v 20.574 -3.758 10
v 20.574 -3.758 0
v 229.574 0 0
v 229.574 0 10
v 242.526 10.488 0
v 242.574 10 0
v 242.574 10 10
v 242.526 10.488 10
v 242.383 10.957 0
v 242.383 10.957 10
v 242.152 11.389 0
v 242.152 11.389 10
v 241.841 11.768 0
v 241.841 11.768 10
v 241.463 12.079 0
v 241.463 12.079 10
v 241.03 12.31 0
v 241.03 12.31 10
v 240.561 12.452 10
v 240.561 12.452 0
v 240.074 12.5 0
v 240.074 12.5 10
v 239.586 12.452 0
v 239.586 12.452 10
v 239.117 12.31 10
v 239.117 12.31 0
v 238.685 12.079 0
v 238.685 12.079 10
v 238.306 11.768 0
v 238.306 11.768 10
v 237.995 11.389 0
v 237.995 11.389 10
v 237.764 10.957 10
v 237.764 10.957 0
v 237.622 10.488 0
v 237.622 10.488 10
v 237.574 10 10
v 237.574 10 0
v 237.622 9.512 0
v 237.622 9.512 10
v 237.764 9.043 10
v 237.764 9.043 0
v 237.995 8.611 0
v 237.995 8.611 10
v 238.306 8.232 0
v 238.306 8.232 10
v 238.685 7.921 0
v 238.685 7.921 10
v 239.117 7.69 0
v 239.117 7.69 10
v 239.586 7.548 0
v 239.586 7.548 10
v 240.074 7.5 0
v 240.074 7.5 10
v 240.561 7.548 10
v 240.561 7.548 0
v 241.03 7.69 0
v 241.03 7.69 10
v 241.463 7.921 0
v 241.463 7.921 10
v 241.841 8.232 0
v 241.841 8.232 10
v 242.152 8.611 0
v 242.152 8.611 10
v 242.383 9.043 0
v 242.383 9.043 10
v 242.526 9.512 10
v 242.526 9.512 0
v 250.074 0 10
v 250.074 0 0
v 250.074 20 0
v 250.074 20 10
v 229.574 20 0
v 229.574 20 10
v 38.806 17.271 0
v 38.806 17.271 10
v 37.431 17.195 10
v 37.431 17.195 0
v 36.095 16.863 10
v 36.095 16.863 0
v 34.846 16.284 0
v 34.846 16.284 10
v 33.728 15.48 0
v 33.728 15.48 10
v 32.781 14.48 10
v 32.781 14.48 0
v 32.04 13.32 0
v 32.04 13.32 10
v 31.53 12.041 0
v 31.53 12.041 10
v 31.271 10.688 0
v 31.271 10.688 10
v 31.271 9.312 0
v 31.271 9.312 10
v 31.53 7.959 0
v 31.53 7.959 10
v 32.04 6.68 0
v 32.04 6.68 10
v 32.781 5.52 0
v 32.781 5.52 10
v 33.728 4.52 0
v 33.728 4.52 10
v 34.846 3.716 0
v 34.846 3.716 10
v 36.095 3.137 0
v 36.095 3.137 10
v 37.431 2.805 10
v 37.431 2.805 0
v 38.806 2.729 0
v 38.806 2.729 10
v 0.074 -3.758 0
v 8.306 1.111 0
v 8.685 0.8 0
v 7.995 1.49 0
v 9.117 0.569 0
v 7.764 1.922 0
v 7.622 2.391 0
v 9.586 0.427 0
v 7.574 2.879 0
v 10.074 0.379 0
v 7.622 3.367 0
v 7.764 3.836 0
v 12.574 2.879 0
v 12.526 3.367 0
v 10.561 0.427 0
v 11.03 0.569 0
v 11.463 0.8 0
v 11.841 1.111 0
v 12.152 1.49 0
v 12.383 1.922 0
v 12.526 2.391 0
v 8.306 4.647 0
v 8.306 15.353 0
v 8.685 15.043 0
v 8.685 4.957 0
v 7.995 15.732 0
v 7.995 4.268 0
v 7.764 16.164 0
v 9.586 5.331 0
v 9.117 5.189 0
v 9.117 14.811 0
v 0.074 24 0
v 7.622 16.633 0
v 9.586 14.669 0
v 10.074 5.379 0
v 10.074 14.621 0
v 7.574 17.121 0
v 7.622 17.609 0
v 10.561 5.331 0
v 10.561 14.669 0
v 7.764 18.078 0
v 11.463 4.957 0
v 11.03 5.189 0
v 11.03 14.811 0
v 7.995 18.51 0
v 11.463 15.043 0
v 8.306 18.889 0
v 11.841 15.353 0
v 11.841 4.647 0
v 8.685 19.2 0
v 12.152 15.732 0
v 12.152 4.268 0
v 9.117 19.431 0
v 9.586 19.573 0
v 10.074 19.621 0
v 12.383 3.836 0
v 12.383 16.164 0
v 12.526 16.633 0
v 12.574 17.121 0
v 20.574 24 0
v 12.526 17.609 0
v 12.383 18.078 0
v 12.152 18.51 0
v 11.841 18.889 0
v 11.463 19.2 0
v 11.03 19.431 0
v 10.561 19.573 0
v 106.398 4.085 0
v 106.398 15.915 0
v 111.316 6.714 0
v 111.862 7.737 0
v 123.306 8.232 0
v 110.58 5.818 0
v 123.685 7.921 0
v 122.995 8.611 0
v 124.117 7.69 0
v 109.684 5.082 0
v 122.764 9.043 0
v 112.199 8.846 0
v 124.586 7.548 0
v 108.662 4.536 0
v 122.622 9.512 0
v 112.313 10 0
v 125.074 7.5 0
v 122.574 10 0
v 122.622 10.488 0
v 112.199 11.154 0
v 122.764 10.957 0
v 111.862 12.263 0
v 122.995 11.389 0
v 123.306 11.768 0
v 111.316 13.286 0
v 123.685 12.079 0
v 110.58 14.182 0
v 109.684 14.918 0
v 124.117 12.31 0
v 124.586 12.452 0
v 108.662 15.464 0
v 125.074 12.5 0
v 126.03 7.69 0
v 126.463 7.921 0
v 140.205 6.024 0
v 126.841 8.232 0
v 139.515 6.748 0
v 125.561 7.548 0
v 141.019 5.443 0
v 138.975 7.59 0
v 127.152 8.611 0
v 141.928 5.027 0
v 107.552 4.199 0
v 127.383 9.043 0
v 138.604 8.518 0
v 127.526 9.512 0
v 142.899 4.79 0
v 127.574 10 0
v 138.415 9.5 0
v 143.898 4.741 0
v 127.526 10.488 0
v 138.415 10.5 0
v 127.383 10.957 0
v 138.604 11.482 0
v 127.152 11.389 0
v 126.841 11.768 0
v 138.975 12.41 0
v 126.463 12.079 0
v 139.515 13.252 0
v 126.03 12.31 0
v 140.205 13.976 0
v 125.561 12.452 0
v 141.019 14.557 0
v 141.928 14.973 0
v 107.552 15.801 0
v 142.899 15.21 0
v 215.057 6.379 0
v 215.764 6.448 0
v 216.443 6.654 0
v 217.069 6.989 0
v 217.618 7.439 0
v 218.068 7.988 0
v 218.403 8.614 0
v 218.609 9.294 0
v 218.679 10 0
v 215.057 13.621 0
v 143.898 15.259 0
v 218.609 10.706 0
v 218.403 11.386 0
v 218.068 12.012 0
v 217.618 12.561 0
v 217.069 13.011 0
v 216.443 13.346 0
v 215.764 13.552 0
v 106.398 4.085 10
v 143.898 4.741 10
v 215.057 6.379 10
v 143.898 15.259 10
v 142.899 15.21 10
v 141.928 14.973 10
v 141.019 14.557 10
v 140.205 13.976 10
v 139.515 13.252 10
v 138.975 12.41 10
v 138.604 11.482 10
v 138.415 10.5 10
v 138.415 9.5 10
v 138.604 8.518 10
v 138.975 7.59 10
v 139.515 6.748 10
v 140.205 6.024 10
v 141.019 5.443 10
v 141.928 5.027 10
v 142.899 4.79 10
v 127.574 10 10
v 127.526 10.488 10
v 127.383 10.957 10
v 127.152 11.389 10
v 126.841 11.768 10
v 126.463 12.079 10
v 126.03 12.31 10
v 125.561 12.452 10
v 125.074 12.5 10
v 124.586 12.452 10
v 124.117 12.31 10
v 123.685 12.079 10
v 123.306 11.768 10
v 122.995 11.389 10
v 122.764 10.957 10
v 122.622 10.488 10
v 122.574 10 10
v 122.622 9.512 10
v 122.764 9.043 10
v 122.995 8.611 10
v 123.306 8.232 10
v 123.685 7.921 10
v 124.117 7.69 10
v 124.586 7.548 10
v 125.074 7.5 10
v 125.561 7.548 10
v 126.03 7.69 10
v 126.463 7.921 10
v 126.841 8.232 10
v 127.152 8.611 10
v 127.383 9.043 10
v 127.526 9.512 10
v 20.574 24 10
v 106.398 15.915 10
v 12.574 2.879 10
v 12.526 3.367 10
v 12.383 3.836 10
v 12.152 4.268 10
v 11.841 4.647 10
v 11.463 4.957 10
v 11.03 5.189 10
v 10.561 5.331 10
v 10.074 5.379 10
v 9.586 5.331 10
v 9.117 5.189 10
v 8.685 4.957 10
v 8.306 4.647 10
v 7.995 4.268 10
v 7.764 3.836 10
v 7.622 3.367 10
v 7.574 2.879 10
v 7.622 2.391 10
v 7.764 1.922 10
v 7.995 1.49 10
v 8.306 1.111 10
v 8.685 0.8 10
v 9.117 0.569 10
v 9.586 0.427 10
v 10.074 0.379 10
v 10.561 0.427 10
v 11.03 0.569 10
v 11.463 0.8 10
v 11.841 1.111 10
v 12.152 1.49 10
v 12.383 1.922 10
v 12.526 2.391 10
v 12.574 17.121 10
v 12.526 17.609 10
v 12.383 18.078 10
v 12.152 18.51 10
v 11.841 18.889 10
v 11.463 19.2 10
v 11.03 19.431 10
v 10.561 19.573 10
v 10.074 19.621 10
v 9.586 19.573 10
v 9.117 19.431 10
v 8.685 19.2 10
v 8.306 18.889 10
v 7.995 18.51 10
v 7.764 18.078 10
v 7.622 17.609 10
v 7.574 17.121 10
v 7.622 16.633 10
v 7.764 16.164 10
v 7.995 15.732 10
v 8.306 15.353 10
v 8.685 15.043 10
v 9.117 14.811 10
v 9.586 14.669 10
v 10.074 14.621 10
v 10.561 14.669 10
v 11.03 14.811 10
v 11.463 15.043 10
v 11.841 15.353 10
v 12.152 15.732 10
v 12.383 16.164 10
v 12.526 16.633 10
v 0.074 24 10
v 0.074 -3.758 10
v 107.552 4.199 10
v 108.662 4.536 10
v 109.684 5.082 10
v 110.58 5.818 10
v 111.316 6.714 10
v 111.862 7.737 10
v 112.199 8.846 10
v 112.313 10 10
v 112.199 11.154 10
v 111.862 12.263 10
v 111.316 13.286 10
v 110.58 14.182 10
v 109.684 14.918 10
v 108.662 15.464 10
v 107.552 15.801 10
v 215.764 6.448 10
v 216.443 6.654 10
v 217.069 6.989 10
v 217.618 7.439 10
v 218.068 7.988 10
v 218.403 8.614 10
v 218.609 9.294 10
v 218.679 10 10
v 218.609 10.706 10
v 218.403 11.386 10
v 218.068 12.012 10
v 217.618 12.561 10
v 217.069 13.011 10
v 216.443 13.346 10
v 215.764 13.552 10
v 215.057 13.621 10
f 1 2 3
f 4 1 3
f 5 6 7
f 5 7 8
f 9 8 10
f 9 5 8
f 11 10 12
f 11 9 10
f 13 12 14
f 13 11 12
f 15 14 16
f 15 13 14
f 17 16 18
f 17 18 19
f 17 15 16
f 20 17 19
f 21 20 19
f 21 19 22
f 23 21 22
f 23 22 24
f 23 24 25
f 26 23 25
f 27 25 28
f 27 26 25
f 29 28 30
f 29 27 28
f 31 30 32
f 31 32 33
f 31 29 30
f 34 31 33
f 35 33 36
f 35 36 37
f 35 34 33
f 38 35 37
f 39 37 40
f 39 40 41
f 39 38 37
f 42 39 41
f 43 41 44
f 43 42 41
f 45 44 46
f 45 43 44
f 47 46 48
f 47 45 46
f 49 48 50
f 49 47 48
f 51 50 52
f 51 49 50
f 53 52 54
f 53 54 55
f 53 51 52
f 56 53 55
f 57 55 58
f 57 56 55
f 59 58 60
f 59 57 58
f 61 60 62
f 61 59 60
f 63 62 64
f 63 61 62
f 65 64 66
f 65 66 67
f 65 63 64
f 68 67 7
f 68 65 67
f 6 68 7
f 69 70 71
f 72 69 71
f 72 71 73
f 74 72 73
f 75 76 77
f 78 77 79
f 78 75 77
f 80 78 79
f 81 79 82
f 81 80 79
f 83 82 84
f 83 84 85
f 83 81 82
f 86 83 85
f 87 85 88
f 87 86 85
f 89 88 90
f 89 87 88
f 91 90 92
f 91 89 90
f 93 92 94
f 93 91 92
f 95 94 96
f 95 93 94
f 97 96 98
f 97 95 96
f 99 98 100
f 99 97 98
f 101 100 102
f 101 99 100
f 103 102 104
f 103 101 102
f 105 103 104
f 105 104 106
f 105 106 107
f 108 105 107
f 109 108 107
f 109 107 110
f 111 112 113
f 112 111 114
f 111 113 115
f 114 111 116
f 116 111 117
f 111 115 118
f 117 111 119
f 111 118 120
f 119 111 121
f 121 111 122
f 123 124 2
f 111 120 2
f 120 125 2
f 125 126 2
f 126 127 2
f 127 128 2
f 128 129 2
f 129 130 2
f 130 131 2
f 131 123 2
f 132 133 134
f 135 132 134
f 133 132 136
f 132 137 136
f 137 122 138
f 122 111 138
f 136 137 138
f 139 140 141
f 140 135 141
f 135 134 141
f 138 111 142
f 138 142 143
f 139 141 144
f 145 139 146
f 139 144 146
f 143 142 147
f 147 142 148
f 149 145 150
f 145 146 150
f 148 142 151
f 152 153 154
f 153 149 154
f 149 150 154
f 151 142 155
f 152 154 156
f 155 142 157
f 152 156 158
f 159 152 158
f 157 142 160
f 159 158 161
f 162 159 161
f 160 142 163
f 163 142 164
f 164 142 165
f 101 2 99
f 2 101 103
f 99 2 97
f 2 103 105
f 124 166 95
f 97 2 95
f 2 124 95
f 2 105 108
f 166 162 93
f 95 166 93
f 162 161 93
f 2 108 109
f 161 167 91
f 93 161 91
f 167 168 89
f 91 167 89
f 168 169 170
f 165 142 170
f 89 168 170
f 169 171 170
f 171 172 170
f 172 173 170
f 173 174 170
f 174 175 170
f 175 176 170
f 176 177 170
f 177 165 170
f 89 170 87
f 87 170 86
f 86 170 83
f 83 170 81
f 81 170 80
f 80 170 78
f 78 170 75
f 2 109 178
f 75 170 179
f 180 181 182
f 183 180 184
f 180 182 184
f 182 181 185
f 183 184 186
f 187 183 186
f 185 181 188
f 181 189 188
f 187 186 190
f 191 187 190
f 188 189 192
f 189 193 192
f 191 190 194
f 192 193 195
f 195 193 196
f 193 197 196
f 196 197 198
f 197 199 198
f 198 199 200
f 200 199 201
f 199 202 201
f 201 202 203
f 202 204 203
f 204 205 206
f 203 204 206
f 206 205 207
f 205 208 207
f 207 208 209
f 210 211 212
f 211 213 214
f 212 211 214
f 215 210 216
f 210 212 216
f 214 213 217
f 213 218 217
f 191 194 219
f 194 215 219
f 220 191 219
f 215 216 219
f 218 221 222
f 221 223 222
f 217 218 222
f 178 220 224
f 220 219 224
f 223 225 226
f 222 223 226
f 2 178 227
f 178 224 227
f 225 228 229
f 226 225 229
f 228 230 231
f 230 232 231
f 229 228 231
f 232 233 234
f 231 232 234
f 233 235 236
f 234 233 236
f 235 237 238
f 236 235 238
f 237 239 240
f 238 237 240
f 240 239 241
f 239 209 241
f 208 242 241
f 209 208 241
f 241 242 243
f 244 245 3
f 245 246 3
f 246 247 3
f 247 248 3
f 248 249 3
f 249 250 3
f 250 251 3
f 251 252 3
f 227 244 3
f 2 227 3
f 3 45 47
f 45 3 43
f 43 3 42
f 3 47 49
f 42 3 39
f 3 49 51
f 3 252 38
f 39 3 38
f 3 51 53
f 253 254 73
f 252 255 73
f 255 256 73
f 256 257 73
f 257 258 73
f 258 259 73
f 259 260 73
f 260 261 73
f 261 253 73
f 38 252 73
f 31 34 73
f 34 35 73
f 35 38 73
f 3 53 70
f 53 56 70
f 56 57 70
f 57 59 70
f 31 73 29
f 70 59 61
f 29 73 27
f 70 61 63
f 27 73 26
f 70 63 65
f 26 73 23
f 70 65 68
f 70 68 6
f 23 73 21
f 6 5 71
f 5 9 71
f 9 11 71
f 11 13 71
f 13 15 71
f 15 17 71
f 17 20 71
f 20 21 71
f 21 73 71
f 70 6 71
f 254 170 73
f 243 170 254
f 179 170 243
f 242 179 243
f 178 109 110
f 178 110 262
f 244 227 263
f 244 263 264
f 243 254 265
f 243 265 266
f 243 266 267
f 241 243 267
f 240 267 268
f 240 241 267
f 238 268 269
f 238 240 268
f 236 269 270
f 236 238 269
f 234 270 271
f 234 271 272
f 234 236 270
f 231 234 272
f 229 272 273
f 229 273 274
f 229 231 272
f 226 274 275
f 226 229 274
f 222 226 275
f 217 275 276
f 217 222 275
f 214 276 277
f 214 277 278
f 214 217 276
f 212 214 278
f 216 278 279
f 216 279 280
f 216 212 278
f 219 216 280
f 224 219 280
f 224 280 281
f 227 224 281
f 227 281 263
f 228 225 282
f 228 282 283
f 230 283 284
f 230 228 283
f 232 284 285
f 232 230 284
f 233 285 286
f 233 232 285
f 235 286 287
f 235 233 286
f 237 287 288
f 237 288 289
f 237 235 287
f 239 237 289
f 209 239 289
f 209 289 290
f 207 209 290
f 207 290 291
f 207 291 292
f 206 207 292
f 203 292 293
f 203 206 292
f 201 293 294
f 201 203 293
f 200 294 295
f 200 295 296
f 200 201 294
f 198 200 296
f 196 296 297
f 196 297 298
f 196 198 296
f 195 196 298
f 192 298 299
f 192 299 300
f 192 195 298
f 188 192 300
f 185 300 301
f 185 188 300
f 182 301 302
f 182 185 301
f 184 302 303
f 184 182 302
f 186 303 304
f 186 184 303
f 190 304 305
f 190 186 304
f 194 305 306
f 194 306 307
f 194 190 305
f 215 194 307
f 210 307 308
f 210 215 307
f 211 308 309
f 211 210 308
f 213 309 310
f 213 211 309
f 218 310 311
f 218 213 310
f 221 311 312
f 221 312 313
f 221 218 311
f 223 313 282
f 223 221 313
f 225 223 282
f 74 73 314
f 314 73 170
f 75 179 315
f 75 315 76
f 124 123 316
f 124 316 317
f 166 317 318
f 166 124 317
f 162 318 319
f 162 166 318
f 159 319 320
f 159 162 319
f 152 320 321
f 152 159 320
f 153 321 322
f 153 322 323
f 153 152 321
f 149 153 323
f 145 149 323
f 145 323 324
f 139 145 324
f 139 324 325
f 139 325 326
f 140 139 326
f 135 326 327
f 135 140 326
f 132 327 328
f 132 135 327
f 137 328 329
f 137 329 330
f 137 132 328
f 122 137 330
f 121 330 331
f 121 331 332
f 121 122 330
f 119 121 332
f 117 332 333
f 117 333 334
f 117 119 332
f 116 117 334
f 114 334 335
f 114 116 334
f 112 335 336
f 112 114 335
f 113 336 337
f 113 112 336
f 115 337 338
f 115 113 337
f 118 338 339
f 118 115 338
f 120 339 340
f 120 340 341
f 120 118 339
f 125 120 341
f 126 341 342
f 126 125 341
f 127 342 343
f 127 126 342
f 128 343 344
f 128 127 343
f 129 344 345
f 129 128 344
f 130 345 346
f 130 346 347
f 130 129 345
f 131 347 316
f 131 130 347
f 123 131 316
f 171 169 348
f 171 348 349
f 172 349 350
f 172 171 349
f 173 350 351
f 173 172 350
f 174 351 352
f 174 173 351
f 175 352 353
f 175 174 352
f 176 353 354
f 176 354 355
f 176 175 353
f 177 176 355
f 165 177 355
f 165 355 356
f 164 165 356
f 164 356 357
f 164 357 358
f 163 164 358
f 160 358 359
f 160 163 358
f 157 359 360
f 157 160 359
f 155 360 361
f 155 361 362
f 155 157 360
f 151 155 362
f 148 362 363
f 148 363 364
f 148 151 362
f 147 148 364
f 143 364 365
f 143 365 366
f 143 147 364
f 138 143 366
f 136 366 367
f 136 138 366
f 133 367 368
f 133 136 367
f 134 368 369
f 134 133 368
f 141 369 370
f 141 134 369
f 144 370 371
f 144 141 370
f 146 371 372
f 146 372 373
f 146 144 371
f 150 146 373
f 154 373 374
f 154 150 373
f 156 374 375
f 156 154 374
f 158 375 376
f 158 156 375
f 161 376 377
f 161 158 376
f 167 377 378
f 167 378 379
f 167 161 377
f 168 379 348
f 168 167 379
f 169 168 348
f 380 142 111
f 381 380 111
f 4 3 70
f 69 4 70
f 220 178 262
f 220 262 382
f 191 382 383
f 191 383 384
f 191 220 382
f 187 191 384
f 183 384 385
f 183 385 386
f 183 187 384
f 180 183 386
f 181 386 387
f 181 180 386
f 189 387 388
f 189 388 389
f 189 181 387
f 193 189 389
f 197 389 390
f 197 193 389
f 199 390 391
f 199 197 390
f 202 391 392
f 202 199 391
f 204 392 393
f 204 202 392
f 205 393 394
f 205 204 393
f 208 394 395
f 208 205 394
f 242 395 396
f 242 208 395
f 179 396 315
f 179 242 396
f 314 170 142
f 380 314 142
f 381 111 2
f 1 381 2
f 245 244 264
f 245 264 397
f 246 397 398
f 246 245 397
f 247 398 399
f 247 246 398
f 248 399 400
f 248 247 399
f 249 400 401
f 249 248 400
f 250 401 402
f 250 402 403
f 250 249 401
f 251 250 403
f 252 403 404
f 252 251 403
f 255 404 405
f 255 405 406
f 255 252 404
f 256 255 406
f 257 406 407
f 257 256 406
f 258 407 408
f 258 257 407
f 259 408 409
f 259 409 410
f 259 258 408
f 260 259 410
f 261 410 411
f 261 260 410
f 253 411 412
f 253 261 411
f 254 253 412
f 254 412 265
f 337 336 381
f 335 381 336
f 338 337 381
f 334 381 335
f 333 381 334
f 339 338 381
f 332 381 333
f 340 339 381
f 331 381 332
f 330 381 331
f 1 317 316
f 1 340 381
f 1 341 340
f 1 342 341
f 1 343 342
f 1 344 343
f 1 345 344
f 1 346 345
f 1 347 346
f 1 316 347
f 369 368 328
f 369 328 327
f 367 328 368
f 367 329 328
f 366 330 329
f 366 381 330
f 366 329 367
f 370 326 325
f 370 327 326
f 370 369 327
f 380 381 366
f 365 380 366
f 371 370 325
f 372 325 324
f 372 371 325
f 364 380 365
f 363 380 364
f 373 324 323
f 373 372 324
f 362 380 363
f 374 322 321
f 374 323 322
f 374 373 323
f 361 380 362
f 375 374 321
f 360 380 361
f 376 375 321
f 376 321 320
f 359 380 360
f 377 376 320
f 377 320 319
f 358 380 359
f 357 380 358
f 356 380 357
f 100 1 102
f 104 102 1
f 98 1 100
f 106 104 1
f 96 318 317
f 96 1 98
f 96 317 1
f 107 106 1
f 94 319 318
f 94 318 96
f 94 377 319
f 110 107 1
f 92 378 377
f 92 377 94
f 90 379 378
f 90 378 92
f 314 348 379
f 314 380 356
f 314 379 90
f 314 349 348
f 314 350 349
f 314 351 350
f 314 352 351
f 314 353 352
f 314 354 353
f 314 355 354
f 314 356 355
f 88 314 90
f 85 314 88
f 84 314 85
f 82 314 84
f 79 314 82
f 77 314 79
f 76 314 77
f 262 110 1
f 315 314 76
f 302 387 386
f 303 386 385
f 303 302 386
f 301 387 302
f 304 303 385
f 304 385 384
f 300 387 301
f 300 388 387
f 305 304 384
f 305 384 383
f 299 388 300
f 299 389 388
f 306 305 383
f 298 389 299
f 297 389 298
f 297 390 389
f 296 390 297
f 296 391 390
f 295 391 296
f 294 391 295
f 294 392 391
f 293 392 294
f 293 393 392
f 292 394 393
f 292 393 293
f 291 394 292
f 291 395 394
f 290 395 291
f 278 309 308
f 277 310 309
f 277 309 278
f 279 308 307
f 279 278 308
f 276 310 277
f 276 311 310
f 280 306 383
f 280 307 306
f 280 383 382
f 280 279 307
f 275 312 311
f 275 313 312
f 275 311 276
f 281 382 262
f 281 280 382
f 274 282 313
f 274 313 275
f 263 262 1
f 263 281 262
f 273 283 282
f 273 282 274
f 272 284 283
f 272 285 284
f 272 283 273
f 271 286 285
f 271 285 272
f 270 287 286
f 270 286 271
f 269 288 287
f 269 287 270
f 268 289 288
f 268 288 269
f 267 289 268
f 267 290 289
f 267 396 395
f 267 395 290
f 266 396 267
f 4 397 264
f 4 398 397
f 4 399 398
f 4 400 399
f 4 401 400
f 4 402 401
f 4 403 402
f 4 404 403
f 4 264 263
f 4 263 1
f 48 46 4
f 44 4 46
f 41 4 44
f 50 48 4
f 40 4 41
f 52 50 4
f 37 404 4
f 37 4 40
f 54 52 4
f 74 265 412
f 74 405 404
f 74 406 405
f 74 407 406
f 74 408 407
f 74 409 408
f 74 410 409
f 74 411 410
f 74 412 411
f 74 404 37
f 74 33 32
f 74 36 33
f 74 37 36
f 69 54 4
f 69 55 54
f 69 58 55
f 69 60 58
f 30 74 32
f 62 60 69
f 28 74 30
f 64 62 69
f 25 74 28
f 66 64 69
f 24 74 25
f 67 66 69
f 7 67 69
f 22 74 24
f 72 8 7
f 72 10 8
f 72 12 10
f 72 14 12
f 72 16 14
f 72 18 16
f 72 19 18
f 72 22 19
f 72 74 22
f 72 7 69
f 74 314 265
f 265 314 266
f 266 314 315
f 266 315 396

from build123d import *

# Parameters (mm, degrees)
MODEL_R                     = 2.5
DODANIE_WYCI_GNI_CIE1_DEPTH = 10


with BuildPart() as part:
    # Model → Dodanie-wyciągnięcie1 (new body)
    with BuildSketch(Plane.XY):
        Polygon((229.573669216, 20), (20.573669216, 24), (0.073669216, 24), (0.073669216, -3.757619404), (20.573669216, -3.757619404), (229.573669216, 0), (250.073669216, 0), (250.073669216, 20), align=None)
        with Locations((10.073669216, 17.121190298)):
            Circle(MODEL_R, mode=Mode.SUBTRACT)
        with Locations((240.073669216, 10)):
            Circle(MODEL_R, mode=Mode.SUBTRACT)
        with Locations((10.073669216, 2.878809702)):
            Circle(MODEL_R, mode=Mode.SUBTRACT)
        with Locations((125.073669216, 10)):
            Circle(MODEL_R, mode=Mode.SUBTRACT)
        with BuildLine():
            Line((215.057391591, 13.621190298), (143.897703929, 15.259018411))
            ThreePointArc((143.897703929, 15.259018411), (138.390896743, 10), (143.897703929, 4.740981589))
            Line((143.897703929, 4.740981589), (215.057391591, 6.378809702))
            ThreePointArc((215.057391591, 6.378809702), (218.678581889, 10), (215.057391591, 13.621190298))
        make_face(mode=Mode.SUBTRACT)
        with BuildLine():
            Line((106.398152108, 15.914510504), (38.806300427, 17.270637985))
            ThreePointArc((38.806300427, 17.270637985), (31.237940567, 10), (38.806300427, 2.729362015))
            Line((38.806300427, 2.729362015), (106.398152108, 4.085489496))
            ThreePointArc((106.398152108, 4.085489496), (112.312662612, 10), (106.398152108, 15.914510504))
        make_face(mode=Mode.SUBTRACT)
    extrude(amount=DODANIE_WYCI_GNI_CIE1_DEPTH)


solid = part.part
